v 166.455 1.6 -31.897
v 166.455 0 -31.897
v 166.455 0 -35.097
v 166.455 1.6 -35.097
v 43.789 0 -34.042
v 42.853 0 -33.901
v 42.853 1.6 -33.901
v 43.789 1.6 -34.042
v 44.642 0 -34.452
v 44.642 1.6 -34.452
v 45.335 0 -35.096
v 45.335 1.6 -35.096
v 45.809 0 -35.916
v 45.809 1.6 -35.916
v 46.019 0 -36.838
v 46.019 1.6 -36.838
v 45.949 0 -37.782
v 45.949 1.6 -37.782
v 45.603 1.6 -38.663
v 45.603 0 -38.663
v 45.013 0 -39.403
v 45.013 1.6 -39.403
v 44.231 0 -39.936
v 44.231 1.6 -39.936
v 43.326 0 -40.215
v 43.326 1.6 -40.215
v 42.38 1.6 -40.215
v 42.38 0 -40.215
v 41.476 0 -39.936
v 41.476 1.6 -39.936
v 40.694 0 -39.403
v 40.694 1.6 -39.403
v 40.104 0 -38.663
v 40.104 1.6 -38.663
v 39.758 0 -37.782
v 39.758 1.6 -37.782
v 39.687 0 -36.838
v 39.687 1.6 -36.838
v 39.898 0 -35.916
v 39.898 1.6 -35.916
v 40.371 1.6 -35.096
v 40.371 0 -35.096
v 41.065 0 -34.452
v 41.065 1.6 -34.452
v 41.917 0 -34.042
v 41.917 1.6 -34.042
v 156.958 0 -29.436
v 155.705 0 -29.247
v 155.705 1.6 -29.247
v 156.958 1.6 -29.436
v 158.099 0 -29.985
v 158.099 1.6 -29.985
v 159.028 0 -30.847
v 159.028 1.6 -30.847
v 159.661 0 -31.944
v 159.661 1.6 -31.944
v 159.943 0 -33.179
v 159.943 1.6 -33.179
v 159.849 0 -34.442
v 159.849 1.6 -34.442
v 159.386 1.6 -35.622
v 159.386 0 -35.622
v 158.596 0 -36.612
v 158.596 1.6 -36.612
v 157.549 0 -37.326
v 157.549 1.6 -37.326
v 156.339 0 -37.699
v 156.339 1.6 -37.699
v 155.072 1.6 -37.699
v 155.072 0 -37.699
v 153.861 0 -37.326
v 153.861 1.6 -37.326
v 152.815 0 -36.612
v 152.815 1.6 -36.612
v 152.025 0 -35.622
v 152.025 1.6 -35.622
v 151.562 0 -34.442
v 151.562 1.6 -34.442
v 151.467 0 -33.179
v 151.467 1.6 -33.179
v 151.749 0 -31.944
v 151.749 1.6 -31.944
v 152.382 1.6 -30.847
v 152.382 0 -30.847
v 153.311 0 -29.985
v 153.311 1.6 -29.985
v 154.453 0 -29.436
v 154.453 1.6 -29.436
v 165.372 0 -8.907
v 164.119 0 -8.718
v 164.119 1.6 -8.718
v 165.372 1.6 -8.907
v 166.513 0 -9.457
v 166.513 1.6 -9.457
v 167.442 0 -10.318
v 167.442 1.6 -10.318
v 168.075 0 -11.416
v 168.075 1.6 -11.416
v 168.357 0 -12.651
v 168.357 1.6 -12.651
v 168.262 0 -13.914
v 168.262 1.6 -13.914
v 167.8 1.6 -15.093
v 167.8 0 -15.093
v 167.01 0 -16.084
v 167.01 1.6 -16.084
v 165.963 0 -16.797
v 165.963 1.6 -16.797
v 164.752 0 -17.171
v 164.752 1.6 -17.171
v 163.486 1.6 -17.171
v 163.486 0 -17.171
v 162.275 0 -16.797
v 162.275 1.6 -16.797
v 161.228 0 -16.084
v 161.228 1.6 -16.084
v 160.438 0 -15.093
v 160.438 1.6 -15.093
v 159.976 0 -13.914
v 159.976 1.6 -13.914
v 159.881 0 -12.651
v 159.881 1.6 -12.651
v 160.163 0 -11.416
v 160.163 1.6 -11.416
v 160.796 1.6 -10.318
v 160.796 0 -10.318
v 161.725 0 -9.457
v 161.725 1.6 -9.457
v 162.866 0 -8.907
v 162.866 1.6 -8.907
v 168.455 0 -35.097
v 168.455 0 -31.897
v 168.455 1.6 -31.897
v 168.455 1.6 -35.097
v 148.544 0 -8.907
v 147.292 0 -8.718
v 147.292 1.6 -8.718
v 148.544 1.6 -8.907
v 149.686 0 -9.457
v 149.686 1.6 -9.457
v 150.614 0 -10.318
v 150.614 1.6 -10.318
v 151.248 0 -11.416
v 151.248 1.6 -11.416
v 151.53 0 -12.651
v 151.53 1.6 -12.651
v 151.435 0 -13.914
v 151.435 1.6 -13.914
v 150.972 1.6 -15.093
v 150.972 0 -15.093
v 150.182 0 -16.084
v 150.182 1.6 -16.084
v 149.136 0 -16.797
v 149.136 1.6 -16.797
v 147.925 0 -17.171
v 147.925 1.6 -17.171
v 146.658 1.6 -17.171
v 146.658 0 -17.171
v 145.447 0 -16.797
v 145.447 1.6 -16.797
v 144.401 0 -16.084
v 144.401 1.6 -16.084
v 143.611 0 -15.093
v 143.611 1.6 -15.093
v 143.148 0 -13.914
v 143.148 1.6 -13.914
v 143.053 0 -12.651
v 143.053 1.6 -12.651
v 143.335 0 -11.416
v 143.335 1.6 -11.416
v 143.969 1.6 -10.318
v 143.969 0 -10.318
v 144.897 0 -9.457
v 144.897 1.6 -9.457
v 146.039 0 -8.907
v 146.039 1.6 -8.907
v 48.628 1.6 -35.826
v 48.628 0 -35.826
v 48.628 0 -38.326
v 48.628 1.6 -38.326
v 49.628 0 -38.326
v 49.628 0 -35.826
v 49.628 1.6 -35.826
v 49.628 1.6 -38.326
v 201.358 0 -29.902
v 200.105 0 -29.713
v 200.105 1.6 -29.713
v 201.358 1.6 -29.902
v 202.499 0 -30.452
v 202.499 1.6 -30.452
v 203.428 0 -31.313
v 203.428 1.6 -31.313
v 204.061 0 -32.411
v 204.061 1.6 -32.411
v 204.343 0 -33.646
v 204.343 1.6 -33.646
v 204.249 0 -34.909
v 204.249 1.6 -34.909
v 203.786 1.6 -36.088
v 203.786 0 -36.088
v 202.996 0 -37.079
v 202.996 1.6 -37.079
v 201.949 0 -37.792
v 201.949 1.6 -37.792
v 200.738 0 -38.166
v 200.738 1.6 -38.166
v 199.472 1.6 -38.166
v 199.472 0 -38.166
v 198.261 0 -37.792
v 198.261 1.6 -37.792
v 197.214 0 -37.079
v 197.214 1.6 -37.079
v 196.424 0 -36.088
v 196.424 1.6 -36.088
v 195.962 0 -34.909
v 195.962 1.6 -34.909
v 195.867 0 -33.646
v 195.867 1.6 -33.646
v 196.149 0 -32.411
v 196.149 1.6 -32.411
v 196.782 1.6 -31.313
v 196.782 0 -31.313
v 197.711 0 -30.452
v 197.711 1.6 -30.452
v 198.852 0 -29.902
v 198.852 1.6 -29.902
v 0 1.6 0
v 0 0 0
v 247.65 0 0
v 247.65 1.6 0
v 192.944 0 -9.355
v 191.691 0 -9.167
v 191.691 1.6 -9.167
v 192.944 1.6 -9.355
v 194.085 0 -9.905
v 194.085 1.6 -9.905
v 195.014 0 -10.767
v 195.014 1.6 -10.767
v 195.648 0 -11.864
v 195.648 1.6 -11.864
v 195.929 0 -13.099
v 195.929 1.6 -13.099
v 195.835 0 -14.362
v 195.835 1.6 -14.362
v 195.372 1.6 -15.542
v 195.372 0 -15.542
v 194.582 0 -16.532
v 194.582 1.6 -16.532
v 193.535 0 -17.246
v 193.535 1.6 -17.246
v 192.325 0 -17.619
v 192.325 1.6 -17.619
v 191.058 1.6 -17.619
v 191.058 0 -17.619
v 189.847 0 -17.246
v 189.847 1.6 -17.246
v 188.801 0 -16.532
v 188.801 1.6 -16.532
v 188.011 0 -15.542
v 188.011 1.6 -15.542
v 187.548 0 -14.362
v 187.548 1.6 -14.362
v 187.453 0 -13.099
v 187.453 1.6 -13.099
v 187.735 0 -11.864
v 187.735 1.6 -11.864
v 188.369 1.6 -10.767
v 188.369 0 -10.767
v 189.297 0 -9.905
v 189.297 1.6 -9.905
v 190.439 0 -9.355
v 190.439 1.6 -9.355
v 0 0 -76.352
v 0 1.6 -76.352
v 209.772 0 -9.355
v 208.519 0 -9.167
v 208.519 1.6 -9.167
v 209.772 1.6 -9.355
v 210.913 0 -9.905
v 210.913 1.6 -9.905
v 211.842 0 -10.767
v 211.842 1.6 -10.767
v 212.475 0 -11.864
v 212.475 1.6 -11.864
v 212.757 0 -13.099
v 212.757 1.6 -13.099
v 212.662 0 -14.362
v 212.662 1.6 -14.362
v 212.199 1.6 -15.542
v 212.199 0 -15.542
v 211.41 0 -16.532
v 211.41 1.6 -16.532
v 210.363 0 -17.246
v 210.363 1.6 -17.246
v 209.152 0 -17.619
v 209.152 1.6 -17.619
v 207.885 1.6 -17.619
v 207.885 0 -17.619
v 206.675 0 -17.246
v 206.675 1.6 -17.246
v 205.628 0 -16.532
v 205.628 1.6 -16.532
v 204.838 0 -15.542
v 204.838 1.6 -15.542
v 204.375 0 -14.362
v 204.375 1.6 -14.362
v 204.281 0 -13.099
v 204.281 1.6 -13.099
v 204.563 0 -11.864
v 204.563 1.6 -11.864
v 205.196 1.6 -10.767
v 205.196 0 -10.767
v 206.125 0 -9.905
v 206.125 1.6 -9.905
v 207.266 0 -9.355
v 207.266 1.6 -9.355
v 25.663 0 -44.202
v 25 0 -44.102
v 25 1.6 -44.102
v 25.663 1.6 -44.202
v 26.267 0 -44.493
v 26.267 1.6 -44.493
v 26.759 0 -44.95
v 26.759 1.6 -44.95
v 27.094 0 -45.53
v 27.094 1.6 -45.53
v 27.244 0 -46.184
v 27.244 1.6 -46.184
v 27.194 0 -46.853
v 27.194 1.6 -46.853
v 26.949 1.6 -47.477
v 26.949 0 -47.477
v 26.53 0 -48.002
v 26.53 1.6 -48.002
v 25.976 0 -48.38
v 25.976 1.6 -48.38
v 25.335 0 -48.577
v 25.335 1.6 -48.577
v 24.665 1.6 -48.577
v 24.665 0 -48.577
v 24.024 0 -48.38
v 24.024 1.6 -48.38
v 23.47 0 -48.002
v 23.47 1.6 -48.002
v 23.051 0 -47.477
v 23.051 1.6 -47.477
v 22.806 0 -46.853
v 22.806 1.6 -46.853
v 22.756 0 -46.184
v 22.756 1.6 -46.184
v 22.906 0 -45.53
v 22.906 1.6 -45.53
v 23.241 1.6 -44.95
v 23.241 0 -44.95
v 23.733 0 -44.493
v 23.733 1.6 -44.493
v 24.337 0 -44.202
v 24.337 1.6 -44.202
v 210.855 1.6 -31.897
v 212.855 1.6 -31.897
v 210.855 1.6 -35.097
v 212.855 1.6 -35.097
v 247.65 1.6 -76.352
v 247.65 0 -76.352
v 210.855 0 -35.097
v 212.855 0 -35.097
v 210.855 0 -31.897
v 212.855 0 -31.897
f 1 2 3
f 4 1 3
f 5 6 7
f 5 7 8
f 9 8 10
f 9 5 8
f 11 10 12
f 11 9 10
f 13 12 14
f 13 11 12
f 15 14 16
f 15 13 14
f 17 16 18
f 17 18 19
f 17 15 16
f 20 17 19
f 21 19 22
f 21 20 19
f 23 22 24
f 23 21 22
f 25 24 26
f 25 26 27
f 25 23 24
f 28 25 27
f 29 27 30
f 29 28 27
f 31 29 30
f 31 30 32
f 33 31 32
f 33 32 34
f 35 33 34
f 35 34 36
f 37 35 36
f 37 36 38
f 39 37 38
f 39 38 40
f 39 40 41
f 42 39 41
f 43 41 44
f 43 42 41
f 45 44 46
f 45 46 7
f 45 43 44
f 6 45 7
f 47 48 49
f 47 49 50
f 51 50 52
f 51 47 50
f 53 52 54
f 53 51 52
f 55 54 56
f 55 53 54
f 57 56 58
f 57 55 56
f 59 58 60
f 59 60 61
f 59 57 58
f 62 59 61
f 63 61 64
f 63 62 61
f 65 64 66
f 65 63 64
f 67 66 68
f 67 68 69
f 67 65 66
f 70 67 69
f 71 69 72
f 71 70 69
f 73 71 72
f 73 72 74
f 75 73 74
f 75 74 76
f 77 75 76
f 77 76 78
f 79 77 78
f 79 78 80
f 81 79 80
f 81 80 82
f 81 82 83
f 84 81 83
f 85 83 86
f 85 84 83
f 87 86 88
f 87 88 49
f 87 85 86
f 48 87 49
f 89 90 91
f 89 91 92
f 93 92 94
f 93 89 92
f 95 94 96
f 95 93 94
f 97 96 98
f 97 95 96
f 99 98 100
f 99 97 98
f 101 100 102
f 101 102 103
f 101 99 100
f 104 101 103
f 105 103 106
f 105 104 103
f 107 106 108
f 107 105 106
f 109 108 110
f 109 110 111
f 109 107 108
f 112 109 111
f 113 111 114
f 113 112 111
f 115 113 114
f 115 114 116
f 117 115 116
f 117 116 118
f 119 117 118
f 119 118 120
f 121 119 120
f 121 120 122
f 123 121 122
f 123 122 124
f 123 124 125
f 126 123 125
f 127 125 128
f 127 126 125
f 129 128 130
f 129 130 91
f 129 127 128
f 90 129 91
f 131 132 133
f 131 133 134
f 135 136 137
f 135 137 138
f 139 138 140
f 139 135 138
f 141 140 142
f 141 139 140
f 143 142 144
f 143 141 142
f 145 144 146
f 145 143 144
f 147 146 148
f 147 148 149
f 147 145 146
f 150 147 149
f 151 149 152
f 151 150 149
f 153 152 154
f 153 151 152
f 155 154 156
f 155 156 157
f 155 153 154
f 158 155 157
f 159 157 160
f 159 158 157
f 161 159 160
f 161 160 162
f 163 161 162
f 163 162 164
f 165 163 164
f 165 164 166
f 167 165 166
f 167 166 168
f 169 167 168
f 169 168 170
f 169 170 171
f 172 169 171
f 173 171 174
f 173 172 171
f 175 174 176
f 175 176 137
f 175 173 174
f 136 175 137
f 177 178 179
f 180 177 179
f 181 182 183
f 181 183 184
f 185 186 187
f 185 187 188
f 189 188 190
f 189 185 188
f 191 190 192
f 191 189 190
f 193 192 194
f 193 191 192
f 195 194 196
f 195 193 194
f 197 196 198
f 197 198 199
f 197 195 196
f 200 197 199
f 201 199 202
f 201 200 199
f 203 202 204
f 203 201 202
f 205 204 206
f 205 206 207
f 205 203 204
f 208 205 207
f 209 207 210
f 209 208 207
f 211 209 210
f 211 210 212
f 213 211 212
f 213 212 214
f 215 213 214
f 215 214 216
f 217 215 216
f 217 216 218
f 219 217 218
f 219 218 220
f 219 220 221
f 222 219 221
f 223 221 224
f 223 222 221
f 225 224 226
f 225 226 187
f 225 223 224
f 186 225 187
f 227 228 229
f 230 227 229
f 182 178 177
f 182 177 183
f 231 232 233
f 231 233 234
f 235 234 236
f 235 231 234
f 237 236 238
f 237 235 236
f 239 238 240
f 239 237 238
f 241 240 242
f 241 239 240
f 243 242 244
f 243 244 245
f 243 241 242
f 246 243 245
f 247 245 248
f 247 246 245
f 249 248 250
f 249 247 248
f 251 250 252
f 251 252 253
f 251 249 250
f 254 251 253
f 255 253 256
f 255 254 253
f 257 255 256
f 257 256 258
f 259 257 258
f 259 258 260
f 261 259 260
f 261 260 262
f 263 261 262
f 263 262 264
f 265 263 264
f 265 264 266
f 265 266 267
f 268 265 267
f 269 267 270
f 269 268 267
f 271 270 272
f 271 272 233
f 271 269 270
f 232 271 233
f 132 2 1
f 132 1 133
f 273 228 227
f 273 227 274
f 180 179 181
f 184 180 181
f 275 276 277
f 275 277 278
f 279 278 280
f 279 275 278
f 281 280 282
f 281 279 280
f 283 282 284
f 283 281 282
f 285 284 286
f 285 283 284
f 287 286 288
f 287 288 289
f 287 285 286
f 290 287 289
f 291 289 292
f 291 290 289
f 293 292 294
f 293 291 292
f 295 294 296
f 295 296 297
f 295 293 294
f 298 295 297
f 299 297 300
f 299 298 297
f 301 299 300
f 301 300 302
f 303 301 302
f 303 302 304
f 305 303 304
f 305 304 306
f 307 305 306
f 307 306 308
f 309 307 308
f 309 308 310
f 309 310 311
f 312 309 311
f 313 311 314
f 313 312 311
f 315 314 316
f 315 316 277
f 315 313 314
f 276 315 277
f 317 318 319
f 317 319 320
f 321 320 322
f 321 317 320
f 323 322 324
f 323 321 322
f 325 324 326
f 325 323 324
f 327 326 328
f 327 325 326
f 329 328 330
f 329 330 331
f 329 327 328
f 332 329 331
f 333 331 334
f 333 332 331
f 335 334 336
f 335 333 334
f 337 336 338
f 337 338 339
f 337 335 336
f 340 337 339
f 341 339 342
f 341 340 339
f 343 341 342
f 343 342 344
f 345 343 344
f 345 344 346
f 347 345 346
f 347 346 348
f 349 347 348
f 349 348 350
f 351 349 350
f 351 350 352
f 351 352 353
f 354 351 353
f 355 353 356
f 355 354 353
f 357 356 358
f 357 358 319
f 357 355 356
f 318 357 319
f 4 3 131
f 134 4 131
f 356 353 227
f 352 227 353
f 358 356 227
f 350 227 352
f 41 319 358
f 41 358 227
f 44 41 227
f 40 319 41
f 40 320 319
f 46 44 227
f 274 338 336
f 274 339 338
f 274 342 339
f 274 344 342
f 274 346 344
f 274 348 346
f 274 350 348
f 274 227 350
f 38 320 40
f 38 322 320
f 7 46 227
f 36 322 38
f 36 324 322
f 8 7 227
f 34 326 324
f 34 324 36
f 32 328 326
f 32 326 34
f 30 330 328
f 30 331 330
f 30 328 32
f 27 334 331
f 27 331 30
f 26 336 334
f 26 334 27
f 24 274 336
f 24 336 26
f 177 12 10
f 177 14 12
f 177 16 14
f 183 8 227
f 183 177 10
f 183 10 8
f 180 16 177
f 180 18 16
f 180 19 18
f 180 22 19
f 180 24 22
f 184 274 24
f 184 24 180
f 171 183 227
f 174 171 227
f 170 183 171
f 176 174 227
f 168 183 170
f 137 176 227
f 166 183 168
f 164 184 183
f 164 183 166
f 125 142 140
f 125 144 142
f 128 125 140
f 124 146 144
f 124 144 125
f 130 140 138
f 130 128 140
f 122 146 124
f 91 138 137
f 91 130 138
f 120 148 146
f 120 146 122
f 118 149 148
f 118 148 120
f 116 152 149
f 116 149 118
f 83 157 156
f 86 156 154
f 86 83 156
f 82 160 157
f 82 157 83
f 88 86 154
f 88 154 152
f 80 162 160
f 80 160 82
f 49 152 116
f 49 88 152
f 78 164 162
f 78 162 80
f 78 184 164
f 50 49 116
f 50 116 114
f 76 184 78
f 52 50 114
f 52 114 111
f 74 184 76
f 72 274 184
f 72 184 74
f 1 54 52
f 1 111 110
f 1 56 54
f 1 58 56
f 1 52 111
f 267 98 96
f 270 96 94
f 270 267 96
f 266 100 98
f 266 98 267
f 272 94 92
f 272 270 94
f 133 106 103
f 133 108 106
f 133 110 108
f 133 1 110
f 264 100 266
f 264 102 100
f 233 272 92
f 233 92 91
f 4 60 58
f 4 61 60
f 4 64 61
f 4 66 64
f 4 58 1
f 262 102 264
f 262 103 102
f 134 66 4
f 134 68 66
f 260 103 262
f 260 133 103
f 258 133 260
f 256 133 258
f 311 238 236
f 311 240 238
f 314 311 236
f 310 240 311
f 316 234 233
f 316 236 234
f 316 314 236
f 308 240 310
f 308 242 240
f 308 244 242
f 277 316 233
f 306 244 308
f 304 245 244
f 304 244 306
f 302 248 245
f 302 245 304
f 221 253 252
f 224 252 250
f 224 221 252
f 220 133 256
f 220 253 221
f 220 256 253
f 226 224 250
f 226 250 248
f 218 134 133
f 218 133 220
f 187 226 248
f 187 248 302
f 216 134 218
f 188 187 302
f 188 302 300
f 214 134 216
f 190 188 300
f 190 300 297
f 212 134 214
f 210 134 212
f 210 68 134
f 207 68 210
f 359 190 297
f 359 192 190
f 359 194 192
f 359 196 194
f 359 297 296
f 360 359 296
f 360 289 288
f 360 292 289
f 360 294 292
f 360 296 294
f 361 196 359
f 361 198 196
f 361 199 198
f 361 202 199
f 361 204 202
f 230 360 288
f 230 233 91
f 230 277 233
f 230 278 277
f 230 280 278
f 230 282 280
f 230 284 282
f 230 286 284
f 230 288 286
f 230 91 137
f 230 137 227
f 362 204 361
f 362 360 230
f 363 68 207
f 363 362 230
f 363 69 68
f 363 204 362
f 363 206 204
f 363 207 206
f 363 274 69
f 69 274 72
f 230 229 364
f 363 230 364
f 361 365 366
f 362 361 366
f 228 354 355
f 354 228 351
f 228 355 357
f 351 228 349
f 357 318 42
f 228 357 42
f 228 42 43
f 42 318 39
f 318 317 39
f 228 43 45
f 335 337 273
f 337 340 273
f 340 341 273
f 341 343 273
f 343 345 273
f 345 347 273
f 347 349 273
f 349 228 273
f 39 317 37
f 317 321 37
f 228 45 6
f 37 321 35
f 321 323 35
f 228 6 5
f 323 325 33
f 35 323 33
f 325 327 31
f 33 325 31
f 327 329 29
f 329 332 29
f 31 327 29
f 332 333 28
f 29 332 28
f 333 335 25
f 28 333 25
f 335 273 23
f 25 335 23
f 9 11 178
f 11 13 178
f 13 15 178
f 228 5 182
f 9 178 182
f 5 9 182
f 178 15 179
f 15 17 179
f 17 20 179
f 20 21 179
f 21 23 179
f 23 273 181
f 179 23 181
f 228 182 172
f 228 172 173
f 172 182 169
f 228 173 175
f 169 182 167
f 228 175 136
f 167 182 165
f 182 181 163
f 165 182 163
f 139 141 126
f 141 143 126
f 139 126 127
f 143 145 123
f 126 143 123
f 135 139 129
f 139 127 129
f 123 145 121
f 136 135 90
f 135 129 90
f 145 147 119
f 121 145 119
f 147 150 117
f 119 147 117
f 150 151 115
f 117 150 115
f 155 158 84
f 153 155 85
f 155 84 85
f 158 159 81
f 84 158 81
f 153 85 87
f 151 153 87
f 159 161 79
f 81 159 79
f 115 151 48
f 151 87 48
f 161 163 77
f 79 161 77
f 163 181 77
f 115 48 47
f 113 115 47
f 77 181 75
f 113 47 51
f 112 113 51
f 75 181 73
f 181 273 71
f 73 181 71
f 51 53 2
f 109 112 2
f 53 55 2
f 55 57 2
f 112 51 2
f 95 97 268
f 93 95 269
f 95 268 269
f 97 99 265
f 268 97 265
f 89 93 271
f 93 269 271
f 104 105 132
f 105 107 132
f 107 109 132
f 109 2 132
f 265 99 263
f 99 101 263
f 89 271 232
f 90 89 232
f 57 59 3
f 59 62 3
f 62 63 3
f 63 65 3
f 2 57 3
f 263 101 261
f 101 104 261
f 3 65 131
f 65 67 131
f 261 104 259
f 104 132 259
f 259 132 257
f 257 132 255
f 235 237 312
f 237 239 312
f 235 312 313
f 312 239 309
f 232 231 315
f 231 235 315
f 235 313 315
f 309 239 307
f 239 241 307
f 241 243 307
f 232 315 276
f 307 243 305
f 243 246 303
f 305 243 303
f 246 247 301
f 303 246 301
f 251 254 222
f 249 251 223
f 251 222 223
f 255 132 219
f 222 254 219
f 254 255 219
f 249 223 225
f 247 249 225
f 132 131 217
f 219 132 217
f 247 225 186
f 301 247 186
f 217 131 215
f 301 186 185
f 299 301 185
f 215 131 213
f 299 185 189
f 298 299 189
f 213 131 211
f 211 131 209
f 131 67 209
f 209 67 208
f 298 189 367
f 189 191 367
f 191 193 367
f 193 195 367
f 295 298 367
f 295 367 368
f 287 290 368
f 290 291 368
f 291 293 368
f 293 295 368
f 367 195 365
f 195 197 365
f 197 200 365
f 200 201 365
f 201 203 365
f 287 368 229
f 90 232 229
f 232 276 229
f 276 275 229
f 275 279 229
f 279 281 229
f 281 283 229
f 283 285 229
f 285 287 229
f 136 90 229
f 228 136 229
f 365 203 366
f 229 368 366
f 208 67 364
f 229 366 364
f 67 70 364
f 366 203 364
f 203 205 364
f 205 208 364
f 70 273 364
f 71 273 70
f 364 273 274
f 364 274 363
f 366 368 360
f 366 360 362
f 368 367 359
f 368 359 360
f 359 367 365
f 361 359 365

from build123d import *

# Parameters (mm, degrees)
SKETCH1_W           = 247.65
SKETCH1_H           = 76.3524
SKETCH1_R           = 4.25
SKETCH1_R_2         = 2.25
SKETCH1_R_3         = 3.175
SKETCH1_W_2         = 2
SKETCH1_H_2         = 3.2
SKETCH1_W_3         = 1
SKETCH1_H_3         = 2.5
BOSS_EXTRUDE1_DEPTH = 1.6


with BuildPart() as part:
    # Sketch1 → Boss-Extrude1 (new body)
    with BuildSketch(Plane(origin=(0, 0, 0), x_dir=(1, 0, 0), z_dir=(0, 1, 0))):
        with Locations((123.825, 38.1762)):
            Rectangle(SKETCH1_W, SKETCH1_H)
        with Locations(Location((208.518808658, 13.416643134, 0), (0, 0, 270))):  # turned: the seam where the file's is
            Circle(SKETCH1_R, mode=Mode.SUBTRACT)
        with Locations(Location((191.691308658, 13.416643134, 0), (0, 0, 270))):  # turned: the seam where the file's is
            Circle(SKETCH1_R, mode=Mode.SUBTRACT)
        with Locations(Location((164.119003876, 12.968247461, 0), (0, 0, 270))):  # turned: the seam where the file's is
            Circle(SKETCH1_R, mode=Mode.SUBTRACT)
        with Locations(Location((147.291503876, 12.968247461, 0), (0, 0, 270))):  # turned: the seam where the file's is
            Circle(SKETCH1_R, mode=Mode.SUBTRACT)
        with Locations(Location((200.105058658, 33.963274369, 0), (0, 0, 270))):  # turned: the seam where the file's is
            Circle(SKETCH1_R, mode=Mode.SUBTRACT)
        with Locations(Location((155.705253876, 33.49674194, 0), (0, 0, 270))):  # turned: the seam where the file's is
            Circle(SKETCH1_R, mode=Mode.SUBTRACT)
        with Locations(Location((25, 46.3524, 0), (0, 0, 270))):  # turned: the seam where the file's is
            Circle(SKETCH1_R_2, mode=Mode.SUBTRACT)
        with Locations(Location((42.853159836, 37.07576509, 0), (0, 0, 270))):  # turned: the seam where the file's is
            Circle(SKETCH1_R_3, mode=Mode.SUBTRACT)
        with Locations((211.855058658, 33.49674194)):
            Rectangle(SKETCH1_W_2, SKETCH1_H_2, mode=Mode.SUBTRACT)
        with Locations((167.455253876, 33.49674194)):
            Rectangle(SKETCH1_W_2, SKETCH1_H_2, mode=Mode.SUBTRACT)
        with Locations((49.128159836, 37.07576509)):
            Rectangle(SKETCH1_W_3, SKETCH1_H_3, mode=Mode.SUBTRACT)
    extrude(amount=BOSS_EXTRUDE1_DEPTH)


solid = part.part
